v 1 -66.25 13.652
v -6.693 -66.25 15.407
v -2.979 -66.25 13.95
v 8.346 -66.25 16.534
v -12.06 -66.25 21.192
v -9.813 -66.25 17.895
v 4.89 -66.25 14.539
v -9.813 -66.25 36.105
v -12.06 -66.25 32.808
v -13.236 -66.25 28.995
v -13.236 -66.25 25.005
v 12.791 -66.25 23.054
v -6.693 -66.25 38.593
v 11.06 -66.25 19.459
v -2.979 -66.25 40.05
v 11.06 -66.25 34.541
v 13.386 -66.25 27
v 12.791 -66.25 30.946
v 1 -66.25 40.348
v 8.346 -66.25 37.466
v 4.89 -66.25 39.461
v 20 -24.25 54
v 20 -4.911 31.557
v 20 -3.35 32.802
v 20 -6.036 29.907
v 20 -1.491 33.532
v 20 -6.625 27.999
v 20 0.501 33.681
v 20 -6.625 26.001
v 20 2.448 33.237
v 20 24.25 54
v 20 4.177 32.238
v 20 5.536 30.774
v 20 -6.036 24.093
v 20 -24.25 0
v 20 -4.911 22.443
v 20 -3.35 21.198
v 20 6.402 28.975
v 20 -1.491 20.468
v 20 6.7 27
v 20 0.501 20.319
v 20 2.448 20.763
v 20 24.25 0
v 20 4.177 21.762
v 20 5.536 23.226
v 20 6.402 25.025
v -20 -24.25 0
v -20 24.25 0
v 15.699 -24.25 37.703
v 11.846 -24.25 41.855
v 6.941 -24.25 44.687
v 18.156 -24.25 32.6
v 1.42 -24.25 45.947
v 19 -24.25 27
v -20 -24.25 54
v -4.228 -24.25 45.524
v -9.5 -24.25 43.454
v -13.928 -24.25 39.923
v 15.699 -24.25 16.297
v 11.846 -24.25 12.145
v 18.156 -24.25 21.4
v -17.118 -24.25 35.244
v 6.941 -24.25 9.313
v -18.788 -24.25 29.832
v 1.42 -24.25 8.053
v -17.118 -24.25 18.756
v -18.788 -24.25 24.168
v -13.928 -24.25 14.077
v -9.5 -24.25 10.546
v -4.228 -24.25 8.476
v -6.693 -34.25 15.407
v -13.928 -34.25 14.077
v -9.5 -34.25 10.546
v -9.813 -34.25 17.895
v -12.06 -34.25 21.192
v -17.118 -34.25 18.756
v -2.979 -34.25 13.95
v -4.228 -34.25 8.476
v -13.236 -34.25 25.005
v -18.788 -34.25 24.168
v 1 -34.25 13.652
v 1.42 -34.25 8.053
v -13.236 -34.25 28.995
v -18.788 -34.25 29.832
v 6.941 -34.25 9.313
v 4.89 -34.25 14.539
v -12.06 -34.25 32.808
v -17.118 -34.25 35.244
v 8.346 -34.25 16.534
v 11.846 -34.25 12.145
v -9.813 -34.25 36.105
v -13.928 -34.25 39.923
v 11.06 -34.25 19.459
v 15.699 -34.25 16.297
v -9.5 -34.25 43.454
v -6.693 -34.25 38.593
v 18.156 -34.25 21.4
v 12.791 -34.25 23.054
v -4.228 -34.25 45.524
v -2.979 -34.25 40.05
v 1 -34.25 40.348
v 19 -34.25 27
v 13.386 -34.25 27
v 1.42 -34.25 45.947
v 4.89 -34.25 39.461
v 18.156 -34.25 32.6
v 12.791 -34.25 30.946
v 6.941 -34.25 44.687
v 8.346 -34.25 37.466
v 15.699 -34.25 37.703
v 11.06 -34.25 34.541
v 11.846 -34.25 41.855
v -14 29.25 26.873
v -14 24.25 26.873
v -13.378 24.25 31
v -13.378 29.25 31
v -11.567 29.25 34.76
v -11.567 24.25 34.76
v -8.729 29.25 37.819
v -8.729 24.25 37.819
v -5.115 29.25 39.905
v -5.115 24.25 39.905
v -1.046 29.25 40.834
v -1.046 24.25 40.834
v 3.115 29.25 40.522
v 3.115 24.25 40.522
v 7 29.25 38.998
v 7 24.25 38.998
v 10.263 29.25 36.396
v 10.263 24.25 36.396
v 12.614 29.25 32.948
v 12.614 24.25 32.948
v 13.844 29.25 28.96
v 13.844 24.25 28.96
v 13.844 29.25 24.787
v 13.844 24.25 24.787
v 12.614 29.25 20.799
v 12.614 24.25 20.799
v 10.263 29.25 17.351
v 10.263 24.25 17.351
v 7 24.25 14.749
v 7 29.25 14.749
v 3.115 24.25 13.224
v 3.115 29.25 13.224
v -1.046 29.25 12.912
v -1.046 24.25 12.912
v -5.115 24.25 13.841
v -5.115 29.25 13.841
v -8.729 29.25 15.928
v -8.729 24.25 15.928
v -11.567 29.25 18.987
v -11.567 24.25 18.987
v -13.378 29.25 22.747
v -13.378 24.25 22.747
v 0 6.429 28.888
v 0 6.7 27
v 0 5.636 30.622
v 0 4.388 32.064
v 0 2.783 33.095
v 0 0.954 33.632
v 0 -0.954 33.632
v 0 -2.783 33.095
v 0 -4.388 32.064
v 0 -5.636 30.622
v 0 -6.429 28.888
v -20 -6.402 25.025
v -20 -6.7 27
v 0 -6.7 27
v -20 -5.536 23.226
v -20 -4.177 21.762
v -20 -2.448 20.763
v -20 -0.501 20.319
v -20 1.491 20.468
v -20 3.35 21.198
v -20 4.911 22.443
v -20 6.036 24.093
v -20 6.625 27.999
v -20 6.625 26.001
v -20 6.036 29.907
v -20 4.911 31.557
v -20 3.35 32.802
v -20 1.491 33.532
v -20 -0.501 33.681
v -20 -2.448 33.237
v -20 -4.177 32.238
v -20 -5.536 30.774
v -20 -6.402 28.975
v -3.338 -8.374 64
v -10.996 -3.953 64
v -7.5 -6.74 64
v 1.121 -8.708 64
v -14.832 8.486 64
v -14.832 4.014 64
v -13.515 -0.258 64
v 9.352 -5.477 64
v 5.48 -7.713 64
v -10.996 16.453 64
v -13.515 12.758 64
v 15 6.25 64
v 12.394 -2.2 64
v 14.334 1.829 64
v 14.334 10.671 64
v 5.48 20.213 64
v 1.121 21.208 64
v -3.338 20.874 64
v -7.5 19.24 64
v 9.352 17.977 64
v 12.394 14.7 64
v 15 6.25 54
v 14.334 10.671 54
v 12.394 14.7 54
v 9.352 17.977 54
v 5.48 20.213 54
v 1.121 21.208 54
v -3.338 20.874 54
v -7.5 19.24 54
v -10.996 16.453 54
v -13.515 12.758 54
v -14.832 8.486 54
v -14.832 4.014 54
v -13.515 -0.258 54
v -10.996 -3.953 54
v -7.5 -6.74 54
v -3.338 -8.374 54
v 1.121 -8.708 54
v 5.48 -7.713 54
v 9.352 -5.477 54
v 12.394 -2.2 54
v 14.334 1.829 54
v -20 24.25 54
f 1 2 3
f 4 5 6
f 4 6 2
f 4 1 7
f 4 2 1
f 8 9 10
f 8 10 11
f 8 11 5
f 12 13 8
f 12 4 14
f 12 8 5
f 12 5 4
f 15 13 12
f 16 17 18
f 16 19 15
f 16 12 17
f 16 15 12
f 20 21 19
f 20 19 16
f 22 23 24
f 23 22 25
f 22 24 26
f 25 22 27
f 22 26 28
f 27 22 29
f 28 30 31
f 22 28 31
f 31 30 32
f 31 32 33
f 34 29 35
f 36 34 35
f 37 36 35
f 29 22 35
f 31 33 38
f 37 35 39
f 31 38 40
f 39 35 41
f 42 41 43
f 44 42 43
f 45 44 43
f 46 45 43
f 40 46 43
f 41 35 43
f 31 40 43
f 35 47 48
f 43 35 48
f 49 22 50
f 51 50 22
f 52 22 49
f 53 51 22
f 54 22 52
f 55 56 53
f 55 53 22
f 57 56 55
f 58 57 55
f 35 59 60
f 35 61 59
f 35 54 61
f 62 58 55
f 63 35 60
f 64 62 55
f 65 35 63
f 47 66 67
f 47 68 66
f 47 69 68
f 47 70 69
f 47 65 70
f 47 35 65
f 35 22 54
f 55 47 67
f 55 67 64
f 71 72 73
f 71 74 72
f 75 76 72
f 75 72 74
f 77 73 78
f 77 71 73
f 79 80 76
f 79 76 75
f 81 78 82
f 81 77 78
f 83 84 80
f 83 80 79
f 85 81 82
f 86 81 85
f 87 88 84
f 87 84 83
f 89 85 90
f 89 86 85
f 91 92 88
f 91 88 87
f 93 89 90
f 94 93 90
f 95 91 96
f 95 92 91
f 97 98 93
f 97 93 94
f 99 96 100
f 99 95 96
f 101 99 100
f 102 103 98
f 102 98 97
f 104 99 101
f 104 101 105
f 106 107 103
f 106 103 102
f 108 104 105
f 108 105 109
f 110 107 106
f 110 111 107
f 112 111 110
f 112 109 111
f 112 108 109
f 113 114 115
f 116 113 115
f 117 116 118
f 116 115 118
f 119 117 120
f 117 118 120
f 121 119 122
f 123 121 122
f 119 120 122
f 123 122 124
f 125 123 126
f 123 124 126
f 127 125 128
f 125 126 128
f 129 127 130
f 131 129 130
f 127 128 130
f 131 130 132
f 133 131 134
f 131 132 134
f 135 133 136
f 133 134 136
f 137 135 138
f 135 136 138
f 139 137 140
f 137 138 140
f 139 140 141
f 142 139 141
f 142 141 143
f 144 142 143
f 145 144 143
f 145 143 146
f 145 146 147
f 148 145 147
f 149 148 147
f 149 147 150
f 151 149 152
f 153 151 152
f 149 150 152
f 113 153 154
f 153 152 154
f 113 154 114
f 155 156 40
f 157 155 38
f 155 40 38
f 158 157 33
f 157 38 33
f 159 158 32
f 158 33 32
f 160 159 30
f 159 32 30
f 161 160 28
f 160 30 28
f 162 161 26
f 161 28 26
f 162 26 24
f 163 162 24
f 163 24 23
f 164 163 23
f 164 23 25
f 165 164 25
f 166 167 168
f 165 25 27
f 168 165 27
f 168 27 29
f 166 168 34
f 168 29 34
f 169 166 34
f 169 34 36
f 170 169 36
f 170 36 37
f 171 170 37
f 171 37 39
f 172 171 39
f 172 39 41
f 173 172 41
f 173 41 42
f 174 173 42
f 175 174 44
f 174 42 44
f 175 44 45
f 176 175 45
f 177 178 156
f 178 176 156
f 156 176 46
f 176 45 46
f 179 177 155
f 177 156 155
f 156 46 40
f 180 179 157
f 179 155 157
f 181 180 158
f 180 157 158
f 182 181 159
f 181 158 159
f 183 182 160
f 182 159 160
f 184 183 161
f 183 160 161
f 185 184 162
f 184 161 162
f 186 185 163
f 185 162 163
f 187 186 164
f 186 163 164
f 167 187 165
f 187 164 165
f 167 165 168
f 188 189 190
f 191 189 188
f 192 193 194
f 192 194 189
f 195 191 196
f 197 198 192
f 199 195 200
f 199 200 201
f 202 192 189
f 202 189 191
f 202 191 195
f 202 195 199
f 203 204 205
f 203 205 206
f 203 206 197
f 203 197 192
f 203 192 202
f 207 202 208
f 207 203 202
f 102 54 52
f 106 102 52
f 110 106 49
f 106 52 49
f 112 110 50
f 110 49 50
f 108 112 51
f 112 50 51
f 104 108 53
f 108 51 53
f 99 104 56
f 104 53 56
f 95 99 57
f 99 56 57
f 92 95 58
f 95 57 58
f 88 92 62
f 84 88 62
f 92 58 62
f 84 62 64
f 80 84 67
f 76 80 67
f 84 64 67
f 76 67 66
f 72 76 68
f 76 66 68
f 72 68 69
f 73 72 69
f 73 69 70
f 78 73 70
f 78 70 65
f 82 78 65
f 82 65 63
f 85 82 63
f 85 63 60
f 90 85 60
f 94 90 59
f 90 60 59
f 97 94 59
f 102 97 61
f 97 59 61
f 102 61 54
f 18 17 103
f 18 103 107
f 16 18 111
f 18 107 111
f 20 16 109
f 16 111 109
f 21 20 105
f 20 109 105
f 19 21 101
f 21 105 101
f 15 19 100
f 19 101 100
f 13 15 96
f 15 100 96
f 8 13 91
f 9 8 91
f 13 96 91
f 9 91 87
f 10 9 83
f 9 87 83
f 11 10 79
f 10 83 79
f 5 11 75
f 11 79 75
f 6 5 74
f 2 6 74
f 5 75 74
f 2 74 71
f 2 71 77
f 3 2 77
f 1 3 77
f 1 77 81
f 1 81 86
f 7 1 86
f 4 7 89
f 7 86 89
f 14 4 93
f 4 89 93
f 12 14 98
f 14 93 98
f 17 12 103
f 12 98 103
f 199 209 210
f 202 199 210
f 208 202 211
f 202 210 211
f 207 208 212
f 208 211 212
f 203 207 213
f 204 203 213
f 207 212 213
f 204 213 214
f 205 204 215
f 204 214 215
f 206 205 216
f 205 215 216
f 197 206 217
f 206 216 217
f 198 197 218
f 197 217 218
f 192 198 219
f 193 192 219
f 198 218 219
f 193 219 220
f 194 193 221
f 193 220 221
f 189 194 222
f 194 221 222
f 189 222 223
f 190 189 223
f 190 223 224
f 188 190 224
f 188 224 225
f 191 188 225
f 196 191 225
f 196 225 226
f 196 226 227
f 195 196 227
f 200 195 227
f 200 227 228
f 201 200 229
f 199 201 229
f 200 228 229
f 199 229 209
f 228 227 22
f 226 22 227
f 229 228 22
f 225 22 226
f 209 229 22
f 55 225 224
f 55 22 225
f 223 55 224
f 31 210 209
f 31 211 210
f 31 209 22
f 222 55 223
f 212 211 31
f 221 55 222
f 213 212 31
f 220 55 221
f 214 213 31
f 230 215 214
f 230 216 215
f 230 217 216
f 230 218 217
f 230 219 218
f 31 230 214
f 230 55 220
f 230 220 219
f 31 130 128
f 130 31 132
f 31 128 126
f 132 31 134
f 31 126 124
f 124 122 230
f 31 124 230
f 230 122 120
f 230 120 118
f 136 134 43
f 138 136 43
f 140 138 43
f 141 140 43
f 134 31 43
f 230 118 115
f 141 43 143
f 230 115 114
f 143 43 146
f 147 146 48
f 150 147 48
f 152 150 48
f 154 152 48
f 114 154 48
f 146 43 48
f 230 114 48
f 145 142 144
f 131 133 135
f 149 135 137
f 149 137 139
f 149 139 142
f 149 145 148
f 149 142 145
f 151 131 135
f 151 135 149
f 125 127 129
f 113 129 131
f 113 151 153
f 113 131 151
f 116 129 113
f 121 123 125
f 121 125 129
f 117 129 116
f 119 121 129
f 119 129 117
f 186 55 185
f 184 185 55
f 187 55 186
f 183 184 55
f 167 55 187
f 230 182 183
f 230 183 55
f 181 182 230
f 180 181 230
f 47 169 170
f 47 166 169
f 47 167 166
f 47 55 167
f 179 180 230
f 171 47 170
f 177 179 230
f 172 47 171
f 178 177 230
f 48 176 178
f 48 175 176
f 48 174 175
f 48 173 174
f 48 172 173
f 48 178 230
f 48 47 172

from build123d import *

# Parameters (mm, degrees)
SKETCH1_W           = 48.5
SKETCH1_H           = 40
BOSS_EXTRUDE1_DEPTH = 54
SKETCH2_R           = 15
BOSS_EXTRUDE2_DEPTH = 10
SKETCH3_R           = 14
BOSS_EXTRUDE3_DEPTH = 5
SKETCH4_R           = 19
BOSS_EXTRUDE4_DEPTH = 10
SKETCH5_R           = 13.38588386
BOSS_EXTRUDE5_DEPTH = 32
SKETCH6_R           = 6.7
CUT_EXTRUDE1_DEPTH  = 20
SKETCH7_R           = 6.7
CUT_EXTRUDE2_DEPTH  = 20


with BuildPart() as part:
    # Sketch1 → Boss-Extrude1 (new body)
    with BuildSketch(Plane(origin=(0, 0, 0), x_dir=(0, 1, 0), z_dir=(0, 0, 1))):
        Rectangle(SKETCH1_W, SKETCH1_H)
    extrude(amount=BOSS_EXTRUDE1_DEPTH)

    # Sketch2 → Boss-Extrude2 (add)
    with BuildSketch(Plane.XY.offset(54)):
        with Locations((0, 6.25)):
            Circle(SKETCH2_R)
    extrude(amount=BOSS_EXTRUDE2_DEPTH)

    # Sketch3 → Boss-Extrude3 (add)
    with BuildSketch(Plane(origin=(0, 24.25, 0), x_dir=(-1, 0, 0), z_dir=(0, 1, 0))):
        with Locations((0, 26.873266577)):
            Circle(SKETCH3_R)
    extrude(amount=BOSS_EXTRUDE3_DEPTH)

    # Sketch4 → Boss-Extrude4 (add)
    with BuildSketch(Plane.XZ.offset(24.25)):
        with Locations((0, 27)):
            Circle(SKETCH4_R)
    extrude(amount=BOSS_EXTRUDE4_DEPTH)

    # Sketch5 → Boss-Extrude5 (add)
    with BuildSketch(Plane.XZ.offset(34.25)):
        with Locations((0, 27)):
            Circle(SKETCH5_R)
    extrude(amount=BOSS_EXTRUDE5_DEPTH)

    # Sketch6 → Cut-Extrude1 (cut)
    with BuildSketch(Plane.YZ.offset(20)):
        with Locations((0, 27)):
            Circle(SKETCH6_R)
    extrude(amount=-CUT_EXTRUDE1_DEPTH, mode=Mode.SUBTRACT)

    # Sketch7 → Cut-Extrude2 (cut)
    with BuildSketch(Plane(origin=(-20, 0, 0), x_dir=(0, -1, 0), z_dir=(-1, 0, 0))):
        with Locations((0, 27)):
            Circle(SKETCH7_R)
    extrude(amount=-CUT_EXTRUDE2_DEPTH, mode=Mode.SUBTRACT)


solid = part.part
